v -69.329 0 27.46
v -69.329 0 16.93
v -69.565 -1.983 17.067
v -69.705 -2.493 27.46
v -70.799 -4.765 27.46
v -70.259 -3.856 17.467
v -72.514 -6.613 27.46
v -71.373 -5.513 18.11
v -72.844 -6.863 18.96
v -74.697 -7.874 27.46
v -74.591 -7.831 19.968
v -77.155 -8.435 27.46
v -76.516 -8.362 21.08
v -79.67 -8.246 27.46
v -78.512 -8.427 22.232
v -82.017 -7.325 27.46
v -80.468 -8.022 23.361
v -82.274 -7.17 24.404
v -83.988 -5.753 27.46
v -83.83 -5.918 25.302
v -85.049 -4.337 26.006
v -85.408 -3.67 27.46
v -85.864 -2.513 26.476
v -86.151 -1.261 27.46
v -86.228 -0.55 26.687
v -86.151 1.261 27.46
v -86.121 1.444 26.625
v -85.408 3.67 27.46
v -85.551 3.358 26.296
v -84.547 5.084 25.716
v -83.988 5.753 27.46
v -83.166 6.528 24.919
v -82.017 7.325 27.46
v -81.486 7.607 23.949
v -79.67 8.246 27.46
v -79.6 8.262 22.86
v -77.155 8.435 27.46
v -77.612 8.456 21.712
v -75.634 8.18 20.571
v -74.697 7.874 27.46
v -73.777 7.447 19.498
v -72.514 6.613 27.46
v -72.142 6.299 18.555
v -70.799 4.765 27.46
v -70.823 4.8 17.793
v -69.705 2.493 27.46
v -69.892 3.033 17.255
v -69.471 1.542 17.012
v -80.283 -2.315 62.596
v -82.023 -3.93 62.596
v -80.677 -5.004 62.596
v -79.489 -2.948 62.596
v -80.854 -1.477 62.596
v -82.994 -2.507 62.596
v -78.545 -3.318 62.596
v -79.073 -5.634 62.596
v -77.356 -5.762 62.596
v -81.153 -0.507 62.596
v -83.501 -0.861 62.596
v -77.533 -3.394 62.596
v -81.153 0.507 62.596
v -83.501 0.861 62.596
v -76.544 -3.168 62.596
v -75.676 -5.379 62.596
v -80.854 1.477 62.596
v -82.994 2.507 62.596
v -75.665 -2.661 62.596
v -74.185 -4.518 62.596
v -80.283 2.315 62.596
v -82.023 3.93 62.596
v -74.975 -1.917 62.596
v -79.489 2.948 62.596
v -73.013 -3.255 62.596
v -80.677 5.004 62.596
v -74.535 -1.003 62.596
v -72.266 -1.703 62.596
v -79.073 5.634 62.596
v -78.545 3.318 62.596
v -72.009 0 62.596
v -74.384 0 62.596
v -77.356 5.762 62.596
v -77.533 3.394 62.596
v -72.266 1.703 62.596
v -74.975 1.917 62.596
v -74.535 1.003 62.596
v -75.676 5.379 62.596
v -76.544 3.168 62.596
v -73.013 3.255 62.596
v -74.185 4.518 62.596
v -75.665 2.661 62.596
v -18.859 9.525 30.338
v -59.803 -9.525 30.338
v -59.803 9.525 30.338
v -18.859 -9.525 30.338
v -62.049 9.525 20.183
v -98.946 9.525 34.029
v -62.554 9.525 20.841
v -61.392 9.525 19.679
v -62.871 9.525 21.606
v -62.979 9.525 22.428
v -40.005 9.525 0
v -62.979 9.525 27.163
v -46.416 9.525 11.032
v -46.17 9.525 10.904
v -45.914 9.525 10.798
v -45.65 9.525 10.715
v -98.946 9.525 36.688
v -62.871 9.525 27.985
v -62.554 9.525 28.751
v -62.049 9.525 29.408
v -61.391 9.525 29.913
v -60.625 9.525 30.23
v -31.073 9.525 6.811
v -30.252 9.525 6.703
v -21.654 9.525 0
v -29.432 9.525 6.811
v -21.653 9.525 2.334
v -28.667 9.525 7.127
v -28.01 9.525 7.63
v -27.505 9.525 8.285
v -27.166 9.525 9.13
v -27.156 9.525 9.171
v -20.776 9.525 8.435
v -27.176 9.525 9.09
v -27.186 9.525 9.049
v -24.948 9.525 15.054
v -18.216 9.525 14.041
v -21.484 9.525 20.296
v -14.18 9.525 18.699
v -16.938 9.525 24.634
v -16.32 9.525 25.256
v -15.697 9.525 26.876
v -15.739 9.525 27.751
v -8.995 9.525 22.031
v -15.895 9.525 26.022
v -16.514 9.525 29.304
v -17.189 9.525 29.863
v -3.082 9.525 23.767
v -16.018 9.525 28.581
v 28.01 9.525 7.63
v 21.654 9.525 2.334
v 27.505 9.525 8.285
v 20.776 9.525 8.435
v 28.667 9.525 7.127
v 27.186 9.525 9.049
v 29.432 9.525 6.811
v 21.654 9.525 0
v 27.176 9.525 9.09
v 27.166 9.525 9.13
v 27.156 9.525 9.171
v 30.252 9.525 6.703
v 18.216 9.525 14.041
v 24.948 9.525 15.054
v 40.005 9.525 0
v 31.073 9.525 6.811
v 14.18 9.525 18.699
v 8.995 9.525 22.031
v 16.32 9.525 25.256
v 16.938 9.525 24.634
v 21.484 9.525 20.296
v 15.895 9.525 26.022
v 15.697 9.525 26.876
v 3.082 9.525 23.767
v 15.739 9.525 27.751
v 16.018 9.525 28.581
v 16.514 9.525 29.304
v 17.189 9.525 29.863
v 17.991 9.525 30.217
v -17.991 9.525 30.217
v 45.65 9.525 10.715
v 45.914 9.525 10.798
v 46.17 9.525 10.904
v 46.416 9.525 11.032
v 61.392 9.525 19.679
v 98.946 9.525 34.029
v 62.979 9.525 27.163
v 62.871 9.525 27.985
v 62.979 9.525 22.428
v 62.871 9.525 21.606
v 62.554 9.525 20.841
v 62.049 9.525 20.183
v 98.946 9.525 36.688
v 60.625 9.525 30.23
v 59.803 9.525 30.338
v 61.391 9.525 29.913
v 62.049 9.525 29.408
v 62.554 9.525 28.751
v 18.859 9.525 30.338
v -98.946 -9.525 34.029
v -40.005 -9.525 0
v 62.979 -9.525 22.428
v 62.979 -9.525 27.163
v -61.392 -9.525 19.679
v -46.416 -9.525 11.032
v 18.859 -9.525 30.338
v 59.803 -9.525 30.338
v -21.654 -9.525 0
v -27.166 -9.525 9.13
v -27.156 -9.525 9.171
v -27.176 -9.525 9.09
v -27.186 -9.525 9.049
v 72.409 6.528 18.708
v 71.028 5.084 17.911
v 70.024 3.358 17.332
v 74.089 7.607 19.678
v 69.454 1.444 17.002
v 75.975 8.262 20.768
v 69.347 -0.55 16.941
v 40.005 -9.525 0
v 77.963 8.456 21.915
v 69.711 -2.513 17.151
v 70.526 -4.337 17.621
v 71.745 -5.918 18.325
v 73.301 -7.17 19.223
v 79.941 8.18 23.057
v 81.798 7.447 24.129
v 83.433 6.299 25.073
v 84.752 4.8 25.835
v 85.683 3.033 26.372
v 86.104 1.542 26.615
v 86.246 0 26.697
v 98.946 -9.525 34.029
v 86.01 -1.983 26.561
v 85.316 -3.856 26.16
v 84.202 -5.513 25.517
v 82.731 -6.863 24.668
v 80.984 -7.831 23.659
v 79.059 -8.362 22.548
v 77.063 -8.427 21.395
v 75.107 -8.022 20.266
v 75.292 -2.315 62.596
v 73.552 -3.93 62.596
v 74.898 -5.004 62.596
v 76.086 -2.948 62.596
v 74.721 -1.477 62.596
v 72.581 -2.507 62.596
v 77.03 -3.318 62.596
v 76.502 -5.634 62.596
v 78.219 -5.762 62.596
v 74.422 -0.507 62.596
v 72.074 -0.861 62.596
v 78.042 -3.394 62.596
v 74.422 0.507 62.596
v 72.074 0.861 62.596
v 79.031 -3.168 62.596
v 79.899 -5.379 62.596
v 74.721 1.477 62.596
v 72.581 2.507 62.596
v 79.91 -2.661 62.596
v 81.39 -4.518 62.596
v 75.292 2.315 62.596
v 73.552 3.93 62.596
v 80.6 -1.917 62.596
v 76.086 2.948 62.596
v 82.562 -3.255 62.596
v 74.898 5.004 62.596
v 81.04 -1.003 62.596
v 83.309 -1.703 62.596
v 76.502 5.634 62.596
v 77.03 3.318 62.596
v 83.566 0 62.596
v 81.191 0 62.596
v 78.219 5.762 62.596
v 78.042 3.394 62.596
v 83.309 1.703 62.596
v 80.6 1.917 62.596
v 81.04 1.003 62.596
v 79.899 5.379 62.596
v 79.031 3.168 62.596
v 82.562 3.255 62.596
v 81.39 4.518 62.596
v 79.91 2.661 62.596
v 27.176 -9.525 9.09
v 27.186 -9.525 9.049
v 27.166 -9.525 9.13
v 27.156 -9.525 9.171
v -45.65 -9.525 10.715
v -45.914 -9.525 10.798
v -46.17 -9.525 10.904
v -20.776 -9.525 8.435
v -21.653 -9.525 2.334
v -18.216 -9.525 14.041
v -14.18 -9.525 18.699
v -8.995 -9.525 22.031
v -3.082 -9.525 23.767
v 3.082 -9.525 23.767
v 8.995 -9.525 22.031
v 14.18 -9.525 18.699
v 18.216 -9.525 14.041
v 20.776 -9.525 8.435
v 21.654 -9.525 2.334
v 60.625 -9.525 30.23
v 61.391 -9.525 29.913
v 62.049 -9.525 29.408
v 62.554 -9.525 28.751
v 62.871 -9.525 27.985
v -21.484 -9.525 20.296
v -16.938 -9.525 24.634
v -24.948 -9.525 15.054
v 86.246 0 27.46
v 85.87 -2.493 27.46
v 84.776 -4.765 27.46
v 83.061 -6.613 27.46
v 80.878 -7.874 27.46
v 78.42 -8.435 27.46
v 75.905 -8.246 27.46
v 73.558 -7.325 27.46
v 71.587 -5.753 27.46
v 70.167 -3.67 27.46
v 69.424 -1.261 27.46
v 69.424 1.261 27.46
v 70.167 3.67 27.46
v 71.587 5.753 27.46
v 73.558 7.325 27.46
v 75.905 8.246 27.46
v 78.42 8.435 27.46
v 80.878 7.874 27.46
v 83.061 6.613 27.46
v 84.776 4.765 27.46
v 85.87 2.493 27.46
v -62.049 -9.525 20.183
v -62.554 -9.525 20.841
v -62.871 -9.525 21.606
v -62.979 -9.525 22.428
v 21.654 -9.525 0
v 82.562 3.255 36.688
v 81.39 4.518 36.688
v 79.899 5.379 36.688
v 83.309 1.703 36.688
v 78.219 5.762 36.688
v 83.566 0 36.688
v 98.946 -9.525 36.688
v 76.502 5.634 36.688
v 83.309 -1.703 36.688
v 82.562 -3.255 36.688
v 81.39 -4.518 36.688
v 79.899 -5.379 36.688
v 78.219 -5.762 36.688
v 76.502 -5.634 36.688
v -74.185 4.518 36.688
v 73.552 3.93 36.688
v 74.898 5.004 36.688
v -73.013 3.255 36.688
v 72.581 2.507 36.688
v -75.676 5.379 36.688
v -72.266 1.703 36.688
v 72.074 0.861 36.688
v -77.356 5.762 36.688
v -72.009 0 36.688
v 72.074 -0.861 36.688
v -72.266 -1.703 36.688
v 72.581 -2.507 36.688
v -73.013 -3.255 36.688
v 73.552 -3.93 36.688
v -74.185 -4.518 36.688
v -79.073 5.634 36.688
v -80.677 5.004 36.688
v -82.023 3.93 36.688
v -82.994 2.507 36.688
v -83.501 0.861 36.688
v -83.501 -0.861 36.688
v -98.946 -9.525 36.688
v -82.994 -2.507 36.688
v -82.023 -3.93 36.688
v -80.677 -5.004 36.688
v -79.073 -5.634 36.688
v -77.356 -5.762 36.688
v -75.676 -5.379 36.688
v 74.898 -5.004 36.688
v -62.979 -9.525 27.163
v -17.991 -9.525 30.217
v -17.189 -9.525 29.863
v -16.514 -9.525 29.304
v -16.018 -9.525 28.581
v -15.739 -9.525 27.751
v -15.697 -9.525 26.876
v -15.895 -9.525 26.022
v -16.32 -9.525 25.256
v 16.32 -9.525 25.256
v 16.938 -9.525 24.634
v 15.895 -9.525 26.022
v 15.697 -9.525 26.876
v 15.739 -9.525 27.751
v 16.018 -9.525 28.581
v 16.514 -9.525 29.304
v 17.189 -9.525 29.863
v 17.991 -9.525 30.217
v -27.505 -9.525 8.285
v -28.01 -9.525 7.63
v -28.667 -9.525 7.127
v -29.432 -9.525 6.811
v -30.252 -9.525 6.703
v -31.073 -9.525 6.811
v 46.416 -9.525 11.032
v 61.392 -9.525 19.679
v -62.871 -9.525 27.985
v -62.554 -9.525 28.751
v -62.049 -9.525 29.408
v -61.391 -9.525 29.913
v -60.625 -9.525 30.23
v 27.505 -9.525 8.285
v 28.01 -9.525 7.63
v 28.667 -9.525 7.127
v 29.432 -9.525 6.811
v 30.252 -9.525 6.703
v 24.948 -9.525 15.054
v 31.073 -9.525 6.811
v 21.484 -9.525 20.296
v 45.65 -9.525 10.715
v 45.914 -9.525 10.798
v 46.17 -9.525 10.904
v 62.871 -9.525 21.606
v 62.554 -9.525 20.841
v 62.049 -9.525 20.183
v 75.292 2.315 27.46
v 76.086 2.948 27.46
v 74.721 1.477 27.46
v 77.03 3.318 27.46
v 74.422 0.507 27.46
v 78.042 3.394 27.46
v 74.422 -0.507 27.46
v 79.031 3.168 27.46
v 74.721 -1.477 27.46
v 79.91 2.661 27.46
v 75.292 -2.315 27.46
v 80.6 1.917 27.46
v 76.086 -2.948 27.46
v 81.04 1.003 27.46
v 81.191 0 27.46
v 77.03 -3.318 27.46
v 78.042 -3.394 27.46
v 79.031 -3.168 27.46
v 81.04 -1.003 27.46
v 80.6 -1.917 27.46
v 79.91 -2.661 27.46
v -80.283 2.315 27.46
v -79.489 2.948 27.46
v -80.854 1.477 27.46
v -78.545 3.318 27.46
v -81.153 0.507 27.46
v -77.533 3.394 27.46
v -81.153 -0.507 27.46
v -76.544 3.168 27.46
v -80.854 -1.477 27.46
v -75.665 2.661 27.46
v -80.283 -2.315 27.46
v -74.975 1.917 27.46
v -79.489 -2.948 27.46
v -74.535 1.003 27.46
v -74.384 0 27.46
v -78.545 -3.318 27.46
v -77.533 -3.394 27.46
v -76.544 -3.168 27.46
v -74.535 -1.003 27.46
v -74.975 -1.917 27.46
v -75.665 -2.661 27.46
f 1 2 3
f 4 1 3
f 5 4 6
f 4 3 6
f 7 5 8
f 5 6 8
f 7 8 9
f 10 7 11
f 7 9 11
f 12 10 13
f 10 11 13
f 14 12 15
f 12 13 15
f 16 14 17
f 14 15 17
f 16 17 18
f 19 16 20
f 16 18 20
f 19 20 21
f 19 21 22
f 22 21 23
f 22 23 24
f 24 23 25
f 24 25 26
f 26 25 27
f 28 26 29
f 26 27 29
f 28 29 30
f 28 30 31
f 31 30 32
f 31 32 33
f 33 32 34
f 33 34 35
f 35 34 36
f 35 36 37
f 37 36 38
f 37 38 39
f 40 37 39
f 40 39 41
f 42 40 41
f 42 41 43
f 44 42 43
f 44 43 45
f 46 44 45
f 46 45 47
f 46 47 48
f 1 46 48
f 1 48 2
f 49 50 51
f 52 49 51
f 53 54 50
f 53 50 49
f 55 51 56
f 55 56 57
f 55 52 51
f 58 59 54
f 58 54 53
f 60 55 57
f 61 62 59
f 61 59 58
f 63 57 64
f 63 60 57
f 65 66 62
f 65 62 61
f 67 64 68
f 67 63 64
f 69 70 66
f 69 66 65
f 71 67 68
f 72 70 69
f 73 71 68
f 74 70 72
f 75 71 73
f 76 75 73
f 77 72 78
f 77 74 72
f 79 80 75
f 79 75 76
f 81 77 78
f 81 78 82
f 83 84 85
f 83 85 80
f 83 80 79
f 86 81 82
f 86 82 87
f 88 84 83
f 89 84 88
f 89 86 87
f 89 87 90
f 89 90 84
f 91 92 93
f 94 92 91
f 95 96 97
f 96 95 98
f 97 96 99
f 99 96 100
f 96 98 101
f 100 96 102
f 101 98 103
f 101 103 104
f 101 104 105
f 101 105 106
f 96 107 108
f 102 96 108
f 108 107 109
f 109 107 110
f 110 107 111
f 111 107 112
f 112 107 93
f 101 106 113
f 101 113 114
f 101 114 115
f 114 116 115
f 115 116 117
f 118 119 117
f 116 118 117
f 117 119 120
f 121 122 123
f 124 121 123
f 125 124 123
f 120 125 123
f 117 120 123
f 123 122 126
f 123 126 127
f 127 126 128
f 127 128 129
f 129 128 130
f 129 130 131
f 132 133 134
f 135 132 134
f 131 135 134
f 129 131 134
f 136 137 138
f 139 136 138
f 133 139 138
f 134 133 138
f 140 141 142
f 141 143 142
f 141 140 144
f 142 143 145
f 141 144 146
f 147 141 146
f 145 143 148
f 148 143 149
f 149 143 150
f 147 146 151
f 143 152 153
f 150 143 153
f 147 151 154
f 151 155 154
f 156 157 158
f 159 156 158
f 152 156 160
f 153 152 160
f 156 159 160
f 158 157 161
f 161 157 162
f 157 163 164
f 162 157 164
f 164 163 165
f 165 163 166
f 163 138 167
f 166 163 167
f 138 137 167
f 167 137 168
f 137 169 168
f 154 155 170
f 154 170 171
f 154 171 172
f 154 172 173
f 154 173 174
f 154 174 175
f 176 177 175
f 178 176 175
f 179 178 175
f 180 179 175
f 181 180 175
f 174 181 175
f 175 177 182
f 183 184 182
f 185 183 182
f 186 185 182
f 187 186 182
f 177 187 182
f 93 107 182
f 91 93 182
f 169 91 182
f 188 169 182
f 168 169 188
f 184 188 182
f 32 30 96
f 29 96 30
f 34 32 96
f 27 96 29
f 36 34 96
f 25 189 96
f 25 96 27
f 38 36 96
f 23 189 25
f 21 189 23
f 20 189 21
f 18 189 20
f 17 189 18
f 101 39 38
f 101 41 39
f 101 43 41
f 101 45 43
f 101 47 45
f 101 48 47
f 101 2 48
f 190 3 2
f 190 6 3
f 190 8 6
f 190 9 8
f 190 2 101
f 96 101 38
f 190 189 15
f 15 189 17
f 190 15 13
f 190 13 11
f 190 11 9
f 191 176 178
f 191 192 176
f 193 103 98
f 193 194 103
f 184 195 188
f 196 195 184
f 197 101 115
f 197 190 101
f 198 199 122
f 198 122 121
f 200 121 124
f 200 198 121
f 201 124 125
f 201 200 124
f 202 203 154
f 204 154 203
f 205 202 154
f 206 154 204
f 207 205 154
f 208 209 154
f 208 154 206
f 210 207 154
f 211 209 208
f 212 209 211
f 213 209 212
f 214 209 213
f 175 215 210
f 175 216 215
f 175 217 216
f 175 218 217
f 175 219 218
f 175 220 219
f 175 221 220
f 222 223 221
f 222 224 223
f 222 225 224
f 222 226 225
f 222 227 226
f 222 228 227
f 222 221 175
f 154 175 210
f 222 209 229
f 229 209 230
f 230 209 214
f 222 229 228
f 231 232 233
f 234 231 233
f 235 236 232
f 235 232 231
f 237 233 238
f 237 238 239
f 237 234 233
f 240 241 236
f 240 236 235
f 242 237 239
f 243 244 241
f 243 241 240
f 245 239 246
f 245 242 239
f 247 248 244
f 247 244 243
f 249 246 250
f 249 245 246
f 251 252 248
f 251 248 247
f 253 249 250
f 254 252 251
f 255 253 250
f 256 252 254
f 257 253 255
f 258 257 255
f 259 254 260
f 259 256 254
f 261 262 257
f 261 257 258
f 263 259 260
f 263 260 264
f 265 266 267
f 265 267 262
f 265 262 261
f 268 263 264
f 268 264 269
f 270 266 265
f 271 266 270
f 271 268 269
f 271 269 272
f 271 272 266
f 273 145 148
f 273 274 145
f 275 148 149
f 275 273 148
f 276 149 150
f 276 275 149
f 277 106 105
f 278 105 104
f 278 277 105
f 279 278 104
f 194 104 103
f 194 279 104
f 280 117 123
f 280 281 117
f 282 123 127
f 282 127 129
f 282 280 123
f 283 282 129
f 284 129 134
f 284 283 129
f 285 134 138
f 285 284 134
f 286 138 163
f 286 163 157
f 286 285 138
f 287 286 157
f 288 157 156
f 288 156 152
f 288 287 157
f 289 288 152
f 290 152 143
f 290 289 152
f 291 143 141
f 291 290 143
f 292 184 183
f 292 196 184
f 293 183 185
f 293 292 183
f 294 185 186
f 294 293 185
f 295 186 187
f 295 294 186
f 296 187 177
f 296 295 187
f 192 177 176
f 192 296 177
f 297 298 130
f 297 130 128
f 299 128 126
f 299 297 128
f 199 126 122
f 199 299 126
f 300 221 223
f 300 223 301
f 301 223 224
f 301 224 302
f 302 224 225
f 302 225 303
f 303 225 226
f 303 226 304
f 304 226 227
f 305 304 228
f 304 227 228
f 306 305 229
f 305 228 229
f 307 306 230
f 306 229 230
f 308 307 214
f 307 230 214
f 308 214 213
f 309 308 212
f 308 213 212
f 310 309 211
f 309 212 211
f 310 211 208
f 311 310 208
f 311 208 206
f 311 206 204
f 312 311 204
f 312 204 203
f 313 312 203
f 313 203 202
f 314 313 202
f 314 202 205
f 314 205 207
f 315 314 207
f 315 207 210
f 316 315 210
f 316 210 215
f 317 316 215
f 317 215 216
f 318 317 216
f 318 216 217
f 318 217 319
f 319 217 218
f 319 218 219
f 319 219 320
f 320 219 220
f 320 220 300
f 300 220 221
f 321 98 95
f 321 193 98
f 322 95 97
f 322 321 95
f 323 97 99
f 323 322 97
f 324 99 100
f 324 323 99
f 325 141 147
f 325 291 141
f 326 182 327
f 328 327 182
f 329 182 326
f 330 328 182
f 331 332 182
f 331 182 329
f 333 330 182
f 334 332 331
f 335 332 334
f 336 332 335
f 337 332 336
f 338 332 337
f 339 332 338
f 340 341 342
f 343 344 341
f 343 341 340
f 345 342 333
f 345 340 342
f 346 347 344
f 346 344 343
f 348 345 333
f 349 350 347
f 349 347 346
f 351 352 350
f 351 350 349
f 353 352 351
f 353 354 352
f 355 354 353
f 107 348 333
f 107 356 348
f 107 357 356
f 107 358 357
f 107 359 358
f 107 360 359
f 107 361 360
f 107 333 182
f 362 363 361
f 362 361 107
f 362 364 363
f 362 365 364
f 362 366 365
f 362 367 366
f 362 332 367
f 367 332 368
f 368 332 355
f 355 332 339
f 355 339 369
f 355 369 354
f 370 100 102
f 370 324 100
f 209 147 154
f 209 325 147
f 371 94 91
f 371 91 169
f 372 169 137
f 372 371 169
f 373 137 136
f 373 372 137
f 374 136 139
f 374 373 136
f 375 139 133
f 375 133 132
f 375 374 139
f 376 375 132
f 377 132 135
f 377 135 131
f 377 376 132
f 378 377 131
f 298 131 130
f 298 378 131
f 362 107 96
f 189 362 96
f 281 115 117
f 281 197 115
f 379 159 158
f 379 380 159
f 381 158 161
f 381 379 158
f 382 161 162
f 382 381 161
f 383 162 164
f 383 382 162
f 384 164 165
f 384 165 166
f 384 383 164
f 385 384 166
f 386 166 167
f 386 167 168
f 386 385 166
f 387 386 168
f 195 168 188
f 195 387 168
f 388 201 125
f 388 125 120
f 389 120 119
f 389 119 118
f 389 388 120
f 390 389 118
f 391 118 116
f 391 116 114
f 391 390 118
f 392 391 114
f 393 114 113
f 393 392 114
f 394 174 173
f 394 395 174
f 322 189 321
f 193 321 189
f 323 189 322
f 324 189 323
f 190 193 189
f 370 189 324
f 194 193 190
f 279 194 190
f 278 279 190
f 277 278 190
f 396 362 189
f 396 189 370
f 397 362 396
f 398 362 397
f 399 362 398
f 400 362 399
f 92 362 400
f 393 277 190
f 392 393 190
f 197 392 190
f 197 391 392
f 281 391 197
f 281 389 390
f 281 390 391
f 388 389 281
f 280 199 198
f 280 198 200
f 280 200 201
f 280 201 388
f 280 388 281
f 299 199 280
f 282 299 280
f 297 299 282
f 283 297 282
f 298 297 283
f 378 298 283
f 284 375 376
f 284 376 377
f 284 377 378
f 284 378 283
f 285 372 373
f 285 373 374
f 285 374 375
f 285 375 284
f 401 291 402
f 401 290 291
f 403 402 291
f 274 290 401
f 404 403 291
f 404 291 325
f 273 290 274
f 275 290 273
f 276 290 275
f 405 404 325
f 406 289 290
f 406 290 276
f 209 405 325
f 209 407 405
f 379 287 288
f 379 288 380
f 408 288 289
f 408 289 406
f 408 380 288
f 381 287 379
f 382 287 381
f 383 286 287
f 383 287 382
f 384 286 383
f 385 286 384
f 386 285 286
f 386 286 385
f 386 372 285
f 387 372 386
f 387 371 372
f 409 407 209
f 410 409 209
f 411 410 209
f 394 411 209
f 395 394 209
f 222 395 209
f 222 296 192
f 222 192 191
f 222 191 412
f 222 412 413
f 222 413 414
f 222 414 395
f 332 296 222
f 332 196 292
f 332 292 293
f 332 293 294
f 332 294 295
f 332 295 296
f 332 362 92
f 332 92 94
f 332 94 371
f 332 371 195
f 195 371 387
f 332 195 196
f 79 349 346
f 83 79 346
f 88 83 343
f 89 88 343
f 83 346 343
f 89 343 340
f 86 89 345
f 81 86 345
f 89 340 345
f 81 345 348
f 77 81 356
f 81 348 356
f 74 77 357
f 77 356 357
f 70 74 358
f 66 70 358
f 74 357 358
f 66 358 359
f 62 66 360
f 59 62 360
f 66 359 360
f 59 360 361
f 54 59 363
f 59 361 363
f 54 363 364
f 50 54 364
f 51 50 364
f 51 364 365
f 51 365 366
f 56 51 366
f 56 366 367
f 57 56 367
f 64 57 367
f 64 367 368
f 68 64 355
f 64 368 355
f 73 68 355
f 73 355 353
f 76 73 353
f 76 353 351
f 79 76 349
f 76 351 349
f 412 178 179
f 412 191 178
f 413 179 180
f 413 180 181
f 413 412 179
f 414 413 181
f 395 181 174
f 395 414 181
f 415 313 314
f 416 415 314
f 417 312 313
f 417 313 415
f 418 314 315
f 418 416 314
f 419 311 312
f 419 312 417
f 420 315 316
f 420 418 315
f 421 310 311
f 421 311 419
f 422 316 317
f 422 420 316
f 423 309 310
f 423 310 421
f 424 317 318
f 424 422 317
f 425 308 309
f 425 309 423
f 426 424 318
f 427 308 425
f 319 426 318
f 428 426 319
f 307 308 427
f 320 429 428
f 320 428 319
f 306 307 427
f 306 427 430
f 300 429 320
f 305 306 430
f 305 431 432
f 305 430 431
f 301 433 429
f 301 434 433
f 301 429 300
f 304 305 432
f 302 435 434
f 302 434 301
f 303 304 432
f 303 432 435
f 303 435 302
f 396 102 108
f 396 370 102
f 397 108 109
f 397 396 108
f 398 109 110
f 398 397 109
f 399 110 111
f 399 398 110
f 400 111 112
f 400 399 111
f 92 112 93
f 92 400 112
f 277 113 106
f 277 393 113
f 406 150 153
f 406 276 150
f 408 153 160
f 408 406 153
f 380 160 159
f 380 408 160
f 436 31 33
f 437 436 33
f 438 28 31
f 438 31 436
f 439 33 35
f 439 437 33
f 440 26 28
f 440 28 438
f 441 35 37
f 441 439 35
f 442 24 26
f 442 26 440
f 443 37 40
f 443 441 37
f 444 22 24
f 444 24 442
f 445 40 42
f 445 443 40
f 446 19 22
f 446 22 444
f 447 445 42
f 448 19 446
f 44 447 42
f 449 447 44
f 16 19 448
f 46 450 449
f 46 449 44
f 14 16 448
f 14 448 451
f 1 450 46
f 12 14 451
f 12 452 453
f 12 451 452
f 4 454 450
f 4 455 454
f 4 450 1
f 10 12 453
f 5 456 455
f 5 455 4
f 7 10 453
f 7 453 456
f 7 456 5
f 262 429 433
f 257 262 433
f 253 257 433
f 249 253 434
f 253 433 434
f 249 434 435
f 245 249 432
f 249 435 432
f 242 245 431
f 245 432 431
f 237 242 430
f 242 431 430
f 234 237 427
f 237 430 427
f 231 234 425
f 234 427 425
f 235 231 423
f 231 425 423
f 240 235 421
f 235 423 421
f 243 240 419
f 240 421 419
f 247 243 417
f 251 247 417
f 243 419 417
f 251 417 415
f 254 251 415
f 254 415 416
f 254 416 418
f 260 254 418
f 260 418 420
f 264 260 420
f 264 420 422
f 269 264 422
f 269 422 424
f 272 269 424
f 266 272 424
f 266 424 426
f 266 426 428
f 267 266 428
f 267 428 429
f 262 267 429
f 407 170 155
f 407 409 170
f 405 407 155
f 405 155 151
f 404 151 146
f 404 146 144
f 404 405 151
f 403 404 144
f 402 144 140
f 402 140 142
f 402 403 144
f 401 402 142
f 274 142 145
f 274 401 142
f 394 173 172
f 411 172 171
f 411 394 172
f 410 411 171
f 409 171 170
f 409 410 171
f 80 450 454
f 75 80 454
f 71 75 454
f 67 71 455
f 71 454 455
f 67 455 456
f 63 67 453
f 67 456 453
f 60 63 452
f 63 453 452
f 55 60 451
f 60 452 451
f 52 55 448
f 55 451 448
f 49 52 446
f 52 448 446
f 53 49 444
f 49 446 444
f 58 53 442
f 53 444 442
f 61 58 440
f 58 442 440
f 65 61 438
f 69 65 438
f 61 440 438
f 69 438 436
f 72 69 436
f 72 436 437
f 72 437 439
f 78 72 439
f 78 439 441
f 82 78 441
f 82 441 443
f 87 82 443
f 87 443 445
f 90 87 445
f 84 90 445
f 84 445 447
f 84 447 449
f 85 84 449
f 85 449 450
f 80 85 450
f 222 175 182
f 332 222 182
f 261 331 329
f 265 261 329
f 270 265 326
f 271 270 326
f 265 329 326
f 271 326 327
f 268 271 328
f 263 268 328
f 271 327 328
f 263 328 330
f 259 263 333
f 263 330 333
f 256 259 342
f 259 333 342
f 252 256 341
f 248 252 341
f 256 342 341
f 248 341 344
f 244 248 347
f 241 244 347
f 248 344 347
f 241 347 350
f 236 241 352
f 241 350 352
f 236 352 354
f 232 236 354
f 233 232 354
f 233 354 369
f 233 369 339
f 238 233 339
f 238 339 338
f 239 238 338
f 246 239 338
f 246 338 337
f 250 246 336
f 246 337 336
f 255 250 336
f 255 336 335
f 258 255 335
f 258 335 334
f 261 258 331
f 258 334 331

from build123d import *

# Parameters (mm, degrees)
F1_DEPTH = 9.525
F3_R     = 8.4582
F4_DEPTH = 27.45994
F6_R     = 5.7785
F7_DEPTH = 25.908
F8_R     = 3.4036
F9_DEPTH = 76.2


with BuildPart() as f1:
    # F0 (on Front) → F1 (new body, symmetric)
    with BuildSketch(Plane.XZ):
        with BuildLine():
            Line((21.6535, 0), (40.005, 0))
            Line((40.005, 0), (98.9457, 34.0294290112))
            Line((98.9457, 34.0294290112), (98.9457, 36.68776))
            Line((98.9457, 36.68776), (-98.9457, 36.68776))
            Line((-98.9457, 36.68776), (-98.9457, 34.0294290112))
            Line((-98.9457, 34.0294290112), (-40.005, 0))
            Line((-40.005, 0), (-21.6535, 0))
            Line((-21.6535, 0), (-21.6535, 2.33426))
            ThreePointArc((-21.6535, 2.33426), (0, 23.98776), (21.6535, 2.33426))
            Line((21.6535, 2.33426), (21.6535, 0))
        make_face()
        with BuildLine():
            Line((-59.8033378542, 30.33776), (-18.8585378542, 30.33776))
            ThreePointArc((-18.8585378542, 30.33776), (-15.8495372268, 28.1759432135), (-16.9381164842, 24.6343995112))
            ThreePointArc((-16.9381164842, 24.6343995112), (-23.3636326477, 17.7724166824), (-27.1562111419, 9.170648569))
            ThreePointArc((-27.1562111419, 9.170648569), (-27.1707416417, 9.1098353716), (-27.1864668557, 9.0493201004))
            ThreePointArc((-27.1864668557, 9.0493201004), (-28.6668651927, 7.1267195186), (-31.072771318, 6.8111439337))
            Line((-31.072771318, 6.8111439337), (-45.649831318, 10.7151239337))
            ThreePointArc((-45.649831318, 10.7151239337), (-46.0432879059, 10.848642966), (-46.4159399977, 11.0323977948))
            Line((-46.4159399977, 11.0323977948), (-61.3917799977, 19.6785577948))
            ThreePointArc((-61.3917799977, 19.6785577948), (-62.5539248829, 20.8406899989), (-62.9793, 22.4282))
            Line((-62.9793, 22.4282), (-62.9793, 27.16276))
            ThreePointArc((-62.9793, 27.16276), (-62.0490238861, 29.4081642686), (-59.8033378542, 30.33776))
        make_face(mode=Mode.SUBTRACT)
        with BuildLine():
            ThreePointArc((31.072771318, 6.8111439337), (28.6668651927, 7.1267195186), (27.1864668557, 9.0493201004))
            ThreePointArc((27.1864668557, 9.0493201004), (27.1707416417, 9.1098353716), (27.1562111419, 9.170648569))
            ThreePointArc((27.1562111419, 9.170648569), (23.3636326477, 17.7724166824), (16.9381164842, 24.6343995112))
            ThreePointArc((16.9381164842, 24.6343995112), (15.8495372268, 28.1759432135), (18.8585378542, 30.33776))
            Line((18.8585378542, 30.33776), (59.8033378542, 30.33776))
            ThreePointArc((59.8033378542, 30.33776), (62.0490238861, 29.4081642686), (62.9793, 27.16276))
            Line((62.9793, 27.16276), (62.9793, 22.4282))
            ThreePointArc((62.9793, 22.4282), (62.5539248829, 20.8406899989), (61.3917799977, 19.6785577948))
            Line((61.3917799977, 19.6785577948), (46.4159399977, 11.0323977948))
            ThreePointArc((46.4159399977, 11.0323977948), (46.0432879059, 10.848642966), (45.649831318, 10.7151239337))
            Line((45.649831318, 10.7151239337), (31.072771318, 6.8111439337))
        make_face(mode=Mode.SUBTRACT)
    extrude(amount=F1_DEPTH, both=True)

    # F3 (on offset) → F4 (cut)
    with BuildSketch(Plane(origin=(0, 0, 0), x_dir=(1, 0, 0), z_dir=(0, 0, -1))):
        with Locations((-77.7875, 0)):
            Circle(F3_R)
        with Locations((77.7875, 0)):
            Circle(F3_R)
    extrude(amount=-F4_DEPTH, mode=Mode.SUBTRACT)

    # F6 (on offset) → F7 (join)
    with BuildSketch(Plane.XY.offset(36.68776)):
        with Locations((-77.7875, 0)):
            Circle(F6_R)
        with Locations((77.7875, 0)):
            Circle(F6_R)
    extrude(amount=F7_DEPTH)

    # F8 (on offset) → F9 (cut)
    with BuildSketch(Plane(origin=(0, 0, 0), x_dir=(1, 0, 0), z_dir=(0, 0, -1))):
        with Locations((-77.7875, 0)):
            Circle(F8_R)
        with Locations((77.7875, 0)):
            Circle(F8_R)
    extrude(amount=-F9_DEPTH, mode=Mode.SUBTRACT)


solid = f1.part
